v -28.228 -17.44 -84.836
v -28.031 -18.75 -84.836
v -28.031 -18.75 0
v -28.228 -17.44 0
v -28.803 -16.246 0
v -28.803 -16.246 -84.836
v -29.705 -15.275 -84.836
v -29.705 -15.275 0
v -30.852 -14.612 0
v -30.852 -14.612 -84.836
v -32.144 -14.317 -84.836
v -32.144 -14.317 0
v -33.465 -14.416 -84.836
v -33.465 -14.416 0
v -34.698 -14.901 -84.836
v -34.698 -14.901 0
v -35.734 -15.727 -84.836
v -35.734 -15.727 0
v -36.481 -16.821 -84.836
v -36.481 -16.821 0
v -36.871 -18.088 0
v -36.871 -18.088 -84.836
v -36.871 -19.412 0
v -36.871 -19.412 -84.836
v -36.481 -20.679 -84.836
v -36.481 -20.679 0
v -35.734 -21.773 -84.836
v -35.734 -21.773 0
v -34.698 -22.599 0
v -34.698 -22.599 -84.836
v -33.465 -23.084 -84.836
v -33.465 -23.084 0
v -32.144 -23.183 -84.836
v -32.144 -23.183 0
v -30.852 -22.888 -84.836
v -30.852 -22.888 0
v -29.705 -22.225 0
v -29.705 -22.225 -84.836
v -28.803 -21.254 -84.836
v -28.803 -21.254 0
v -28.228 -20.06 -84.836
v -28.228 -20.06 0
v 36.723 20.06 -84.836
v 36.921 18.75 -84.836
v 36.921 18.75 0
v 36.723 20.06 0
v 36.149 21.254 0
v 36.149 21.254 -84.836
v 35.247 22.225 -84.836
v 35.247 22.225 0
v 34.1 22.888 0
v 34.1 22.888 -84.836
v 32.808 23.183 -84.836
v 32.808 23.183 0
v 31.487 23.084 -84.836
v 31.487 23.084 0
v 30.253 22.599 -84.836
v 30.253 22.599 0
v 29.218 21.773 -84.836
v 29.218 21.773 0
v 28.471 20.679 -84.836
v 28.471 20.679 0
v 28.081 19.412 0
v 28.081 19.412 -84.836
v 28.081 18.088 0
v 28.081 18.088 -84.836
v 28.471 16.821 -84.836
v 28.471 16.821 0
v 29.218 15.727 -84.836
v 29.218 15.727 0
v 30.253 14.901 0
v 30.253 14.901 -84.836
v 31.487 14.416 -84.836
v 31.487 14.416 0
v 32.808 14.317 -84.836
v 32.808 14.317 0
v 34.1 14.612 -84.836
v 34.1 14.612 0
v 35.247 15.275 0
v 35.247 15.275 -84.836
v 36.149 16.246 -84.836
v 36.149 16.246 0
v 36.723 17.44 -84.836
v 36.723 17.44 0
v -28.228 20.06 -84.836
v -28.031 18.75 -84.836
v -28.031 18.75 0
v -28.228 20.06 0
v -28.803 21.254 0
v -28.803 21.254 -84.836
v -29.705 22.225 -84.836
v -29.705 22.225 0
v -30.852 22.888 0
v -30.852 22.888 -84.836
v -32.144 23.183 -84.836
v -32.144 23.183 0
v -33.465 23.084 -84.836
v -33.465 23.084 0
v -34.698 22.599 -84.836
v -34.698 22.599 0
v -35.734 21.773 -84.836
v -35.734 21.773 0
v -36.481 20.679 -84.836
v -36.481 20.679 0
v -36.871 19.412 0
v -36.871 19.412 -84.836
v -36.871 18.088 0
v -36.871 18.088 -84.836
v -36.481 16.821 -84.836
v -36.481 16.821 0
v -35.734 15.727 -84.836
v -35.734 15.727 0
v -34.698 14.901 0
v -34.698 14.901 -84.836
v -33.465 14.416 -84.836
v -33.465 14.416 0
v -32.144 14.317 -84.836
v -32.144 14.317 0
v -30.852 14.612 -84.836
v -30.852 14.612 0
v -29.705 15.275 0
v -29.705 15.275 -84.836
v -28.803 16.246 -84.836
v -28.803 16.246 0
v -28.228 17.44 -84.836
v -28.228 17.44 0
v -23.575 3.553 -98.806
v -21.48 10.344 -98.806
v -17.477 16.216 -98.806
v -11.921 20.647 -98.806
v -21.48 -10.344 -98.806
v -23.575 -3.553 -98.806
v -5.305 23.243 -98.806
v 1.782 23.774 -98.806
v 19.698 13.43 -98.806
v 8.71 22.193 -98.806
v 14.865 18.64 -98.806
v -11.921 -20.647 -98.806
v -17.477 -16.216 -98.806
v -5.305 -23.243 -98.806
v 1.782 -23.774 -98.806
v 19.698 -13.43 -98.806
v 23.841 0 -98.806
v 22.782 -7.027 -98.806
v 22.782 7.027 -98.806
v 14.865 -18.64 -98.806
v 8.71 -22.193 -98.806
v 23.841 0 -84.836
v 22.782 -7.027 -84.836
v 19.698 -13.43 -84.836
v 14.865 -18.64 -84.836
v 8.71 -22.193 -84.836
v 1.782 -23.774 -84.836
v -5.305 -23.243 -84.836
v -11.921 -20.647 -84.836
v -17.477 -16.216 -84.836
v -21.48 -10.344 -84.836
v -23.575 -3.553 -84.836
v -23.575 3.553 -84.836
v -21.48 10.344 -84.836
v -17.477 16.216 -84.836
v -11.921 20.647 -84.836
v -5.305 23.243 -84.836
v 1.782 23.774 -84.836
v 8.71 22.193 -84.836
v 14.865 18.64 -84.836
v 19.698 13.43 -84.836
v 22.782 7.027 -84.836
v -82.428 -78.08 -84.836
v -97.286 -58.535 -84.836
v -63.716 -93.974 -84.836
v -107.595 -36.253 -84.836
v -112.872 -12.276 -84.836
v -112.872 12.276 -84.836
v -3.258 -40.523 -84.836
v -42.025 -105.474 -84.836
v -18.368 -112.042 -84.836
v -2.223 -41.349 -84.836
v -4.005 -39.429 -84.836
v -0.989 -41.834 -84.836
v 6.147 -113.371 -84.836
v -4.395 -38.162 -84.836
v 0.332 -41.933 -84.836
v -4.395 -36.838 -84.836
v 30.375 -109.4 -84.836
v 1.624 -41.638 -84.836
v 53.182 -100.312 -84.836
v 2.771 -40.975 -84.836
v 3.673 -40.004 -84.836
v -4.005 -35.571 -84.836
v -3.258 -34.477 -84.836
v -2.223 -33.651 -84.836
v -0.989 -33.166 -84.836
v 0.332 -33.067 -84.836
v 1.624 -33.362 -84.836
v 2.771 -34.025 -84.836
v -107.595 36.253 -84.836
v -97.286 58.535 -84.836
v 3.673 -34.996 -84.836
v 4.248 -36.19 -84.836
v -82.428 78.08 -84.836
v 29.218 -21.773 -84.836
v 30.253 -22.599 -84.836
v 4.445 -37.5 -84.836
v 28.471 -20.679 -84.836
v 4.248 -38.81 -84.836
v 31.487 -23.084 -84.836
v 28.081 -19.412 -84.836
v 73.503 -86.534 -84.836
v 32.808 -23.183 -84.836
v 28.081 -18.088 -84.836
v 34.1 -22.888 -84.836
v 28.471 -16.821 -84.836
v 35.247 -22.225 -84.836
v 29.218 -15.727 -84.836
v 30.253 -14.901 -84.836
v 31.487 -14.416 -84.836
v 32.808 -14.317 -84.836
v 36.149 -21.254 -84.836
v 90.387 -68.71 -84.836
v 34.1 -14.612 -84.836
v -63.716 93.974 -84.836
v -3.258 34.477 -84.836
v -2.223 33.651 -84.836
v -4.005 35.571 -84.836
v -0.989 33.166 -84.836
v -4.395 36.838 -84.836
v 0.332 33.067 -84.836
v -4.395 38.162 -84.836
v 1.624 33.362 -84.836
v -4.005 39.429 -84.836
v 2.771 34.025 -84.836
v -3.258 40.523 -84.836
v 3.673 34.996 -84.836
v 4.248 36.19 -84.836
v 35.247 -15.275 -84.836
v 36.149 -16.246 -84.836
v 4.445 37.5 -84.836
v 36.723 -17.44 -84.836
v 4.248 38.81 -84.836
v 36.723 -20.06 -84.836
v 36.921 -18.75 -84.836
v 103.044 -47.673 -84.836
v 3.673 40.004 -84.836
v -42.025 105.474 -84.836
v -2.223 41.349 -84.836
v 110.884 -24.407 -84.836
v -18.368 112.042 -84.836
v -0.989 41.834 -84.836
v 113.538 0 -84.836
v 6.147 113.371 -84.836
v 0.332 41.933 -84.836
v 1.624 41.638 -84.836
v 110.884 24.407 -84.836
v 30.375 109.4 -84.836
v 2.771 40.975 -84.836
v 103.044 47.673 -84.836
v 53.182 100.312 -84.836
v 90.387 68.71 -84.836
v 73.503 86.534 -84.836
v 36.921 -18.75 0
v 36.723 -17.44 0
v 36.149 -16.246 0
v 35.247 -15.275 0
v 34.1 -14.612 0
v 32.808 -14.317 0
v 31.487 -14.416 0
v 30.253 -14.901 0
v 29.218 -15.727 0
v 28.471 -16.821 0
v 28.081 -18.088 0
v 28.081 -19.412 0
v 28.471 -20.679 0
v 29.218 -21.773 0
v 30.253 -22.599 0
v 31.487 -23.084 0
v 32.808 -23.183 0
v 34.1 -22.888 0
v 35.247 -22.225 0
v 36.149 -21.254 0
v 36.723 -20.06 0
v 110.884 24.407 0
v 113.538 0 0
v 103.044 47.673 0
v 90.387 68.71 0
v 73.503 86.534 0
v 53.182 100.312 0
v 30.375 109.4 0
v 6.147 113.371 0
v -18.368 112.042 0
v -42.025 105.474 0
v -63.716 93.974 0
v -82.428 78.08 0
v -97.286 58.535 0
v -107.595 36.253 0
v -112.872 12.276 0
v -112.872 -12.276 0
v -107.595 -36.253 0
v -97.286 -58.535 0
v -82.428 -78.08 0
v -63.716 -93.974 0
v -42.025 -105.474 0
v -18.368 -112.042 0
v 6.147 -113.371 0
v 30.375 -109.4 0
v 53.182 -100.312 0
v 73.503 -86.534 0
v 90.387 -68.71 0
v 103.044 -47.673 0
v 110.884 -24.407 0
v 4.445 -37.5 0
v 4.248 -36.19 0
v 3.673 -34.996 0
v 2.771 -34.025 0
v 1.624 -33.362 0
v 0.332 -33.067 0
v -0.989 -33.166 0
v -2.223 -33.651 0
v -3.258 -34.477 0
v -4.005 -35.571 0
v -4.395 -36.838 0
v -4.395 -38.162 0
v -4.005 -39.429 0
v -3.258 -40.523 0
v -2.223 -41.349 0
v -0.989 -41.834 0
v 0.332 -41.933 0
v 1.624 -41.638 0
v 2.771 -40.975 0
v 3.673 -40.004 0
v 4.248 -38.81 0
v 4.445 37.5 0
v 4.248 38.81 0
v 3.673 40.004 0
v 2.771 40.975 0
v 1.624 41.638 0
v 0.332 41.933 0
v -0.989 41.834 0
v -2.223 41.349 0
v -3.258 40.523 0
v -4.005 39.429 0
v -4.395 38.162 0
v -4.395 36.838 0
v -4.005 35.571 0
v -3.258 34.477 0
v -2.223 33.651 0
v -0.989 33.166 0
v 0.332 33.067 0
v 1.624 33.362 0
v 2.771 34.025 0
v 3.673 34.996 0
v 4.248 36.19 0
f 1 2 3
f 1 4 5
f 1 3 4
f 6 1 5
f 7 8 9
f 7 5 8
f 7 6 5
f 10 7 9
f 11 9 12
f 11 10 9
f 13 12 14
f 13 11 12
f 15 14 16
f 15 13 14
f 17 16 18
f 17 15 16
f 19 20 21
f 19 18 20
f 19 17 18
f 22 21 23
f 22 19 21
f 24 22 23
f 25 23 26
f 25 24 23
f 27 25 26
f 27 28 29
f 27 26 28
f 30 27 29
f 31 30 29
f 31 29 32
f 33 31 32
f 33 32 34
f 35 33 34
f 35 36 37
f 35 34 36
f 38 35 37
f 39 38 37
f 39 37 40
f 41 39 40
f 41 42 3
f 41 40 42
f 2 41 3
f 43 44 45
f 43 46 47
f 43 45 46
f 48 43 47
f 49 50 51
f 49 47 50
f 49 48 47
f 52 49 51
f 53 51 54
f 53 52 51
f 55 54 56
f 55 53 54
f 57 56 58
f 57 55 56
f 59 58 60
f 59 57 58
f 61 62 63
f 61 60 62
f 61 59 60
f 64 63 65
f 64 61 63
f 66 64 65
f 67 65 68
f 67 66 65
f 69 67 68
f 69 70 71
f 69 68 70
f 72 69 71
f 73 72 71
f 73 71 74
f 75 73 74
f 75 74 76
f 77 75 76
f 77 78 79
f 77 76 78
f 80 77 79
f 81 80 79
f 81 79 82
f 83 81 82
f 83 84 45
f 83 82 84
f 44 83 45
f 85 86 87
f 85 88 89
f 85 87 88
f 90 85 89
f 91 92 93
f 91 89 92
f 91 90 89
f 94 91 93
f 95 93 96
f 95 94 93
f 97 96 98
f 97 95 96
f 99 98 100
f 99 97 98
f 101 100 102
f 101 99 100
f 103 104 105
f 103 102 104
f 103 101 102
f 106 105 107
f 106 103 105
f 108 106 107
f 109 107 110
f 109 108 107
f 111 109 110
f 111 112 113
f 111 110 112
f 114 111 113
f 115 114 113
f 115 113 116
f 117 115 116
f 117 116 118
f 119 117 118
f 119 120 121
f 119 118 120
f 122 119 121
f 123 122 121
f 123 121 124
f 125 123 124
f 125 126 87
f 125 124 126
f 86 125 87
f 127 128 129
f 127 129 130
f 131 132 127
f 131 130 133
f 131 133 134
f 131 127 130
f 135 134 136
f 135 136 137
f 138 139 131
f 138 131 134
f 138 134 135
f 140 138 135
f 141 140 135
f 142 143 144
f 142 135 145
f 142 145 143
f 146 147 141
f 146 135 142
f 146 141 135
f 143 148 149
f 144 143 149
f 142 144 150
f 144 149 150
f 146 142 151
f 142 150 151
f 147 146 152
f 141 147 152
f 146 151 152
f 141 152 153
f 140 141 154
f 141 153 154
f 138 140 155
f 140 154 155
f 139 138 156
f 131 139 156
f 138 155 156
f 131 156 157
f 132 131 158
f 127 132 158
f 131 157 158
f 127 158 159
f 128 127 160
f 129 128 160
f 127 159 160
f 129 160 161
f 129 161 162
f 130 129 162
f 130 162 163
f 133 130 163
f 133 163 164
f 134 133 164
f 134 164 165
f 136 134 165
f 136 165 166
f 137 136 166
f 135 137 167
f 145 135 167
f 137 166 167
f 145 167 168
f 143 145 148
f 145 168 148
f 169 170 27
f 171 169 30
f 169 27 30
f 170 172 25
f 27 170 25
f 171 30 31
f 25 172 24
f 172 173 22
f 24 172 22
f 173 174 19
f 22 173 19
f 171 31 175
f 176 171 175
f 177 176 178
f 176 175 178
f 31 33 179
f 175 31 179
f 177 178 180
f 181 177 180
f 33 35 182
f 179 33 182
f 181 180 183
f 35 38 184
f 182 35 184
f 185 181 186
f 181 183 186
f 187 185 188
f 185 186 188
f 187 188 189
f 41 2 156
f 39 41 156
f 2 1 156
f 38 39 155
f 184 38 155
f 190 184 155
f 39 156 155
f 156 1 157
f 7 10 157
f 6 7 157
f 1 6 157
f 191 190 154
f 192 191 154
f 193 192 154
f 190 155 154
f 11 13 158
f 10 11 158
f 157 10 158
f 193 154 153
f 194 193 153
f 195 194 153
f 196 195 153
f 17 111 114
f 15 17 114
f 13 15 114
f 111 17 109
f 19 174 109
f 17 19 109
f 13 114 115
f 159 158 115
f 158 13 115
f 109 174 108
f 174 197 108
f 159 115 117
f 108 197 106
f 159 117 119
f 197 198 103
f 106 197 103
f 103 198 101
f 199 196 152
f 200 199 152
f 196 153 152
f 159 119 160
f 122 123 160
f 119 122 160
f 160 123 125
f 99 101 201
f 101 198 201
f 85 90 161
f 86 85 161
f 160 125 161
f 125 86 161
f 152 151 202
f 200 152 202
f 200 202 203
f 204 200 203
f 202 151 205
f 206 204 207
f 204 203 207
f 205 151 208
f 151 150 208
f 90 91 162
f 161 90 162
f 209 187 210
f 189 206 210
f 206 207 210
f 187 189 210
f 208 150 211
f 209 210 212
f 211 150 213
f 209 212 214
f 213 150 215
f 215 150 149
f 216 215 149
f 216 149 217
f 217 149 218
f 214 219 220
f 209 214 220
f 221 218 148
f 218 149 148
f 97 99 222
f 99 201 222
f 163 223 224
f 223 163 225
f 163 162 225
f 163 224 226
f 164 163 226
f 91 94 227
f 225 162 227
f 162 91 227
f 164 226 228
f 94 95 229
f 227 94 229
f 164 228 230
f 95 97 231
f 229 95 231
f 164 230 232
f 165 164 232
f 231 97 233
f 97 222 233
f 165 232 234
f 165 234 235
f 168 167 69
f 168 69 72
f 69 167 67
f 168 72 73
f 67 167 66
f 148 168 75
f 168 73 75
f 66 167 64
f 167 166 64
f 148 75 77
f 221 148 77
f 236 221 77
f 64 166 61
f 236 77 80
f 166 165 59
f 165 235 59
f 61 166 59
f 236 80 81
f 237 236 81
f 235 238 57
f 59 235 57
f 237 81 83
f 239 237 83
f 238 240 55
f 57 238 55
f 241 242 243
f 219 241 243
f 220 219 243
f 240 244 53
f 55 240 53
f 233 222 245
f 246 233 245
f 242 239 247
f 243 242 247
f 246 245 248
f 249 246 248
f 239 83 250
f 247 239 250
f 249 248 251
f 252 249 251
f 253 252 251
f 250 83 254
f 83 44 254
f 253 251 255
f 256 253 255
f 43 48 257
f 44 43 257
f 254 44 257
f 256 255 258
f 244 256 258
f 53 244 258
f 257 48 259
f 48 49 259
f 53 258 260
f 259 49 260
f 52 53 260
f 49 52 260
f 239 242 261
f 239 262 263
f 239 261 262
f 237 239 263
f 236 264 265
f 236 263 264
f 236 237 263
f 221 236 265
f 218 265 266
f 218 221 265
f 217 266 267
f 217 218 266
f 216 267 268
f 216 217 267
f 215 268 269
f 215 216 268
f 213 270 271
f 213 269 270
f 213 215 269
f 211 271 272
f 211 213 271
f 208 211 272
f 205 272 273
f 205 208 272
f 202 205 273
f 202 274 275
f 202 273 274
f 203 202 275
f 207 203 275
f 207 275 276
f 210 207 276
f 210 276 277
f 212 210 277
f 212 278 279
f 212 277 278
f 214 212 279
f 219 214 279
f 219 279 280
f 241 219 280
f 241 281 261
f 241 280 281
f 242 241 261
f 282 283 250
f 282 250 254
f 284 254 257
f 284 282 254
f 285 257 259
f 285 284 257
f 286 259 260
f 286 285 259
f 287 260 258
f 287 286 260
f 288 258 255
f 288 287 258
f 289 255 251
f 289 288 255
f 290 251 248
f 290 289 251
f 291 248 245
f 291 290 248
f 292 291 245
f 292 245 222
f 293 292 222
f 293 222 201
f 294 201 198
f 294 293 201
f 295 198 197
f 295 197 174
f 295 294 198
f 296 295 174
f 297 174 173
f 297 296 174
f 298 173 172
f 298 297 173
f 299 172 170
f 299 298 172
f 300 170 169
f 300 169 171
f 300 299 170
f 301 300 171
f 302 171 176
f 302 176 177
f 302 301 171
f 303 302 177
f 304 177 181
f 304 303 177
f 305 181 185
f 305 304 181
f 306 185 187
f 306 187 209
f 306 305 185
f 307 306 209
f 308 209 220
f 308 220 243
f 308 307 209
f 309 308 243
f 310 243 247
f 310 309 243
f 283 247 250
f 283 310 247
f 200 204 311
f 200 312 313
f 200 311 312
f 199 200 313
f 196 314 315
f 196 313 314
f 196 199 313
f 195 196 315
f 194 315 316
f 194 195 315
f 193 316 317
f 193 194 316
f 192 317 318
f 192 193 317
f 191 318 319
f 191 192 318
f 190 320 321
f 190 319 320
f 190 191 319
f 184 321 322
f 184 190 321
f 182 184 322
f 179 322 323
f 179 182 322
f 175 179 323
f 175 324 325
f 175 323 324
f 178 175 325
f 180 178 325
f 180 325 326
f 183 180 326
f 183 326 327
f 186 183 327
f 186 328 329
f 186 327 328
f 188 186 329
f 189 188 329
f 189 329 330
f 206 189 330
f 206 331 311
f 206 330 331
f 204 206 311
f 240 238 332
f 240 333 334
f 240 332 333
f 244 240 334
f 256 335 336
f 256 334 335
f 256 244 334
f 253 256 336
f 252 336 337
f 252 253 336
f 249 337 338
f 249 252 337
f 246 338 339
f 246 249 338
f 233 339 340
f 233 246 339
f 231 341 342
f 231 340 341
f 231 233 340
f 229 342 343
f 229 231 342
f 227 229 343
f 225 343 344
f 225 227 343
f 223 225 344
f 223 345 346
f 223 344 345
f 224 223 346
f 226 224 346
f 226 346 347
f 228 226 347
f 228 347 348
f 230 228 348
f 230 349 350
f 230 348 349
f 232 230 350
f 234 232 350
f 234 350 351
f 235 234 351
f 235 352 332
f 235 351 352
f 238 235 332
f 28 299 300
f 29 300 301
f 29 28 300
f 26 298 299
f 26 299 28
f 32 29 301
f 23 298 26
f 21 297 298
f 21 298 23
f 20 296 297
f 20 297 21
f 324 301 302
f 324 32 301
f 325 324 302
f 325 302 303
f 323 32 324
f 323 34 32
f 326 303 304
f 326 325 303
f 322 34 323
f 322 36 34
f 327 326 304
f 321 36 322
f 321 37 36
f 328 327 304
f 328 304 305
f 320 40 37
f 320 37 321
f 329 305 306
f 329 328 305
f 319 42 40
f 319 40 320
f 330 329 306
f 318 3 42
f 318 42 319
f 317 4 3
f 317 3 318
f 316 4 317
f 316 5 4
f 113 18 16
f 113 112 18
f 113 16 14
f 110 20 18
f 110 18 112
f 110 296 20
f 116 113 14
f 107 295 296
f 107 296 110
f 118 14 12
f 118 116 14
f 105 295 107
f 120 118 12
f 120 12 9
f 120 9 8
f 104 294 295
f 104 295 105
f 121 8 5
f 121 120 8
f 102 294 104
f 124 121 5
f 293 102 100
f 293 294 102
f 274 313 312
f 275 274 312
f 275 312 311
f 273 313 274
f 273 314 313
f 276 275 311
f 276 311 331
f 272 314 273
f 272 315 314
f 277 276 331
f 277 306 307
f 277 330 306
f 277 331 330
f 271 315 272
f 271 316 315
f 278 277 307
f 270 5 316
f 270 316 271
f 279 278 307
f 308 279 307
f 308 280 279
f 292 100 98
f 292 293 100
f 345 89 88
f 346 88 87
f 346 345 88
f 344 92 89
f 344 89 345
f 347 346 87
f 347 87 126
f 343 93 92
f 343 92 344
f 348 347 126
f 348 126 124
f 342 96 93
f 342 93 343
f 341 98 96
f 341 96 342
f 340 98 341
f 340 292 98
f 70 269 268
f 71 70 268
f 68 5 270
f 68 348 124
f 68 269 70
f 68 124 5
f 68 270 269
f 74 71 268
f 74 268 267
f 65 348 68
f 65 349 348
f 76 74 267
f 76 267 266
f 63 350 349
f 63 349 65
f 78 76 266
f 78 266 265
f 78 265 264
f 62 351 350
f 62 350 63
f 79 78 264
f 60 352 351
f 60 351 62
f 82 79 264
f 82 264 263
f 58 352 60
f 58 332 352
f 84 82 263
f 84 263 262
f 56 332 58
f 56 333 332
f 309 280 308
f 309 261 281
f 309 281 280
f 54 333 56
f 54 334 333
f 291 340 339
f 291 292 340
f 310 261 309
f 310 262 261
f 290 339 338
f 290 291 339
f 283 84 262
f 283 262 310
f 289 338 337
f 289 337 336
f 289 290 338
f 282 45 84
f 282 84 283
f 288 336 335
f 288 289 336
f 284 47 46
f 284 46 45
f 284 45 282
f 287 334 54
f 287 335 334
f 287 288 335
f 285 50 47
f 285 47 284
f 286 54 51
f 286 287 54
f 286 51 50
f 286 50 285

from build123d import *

# Parameters (mm, degrees)
SKETCH1_R               = 113.538
BOSS_EXTRUDE1_DEPTH     = 84.836
CUT_EXTRUDE1_DEPTH      = 182.600941033
CUT_EXTRUDE1_DEPTH_BACK = 182.600941033
SKETCH2_R               = 4.445
SKETCH4_R               = 23.841151021
BOSS_EXTRUDE2_DEPTH     = 13.97


with BuildPart() as part:
    # Sketch1 → Boss-Extrude1 (new body)
    with BuildSketch(Plane.XY):
        Circle(SKETCH1_R)
    extrude(amount=-BOSS_EXTRUDE1_DEPTH)

    # Sketch2 → Cut-Extrude1 (cut, two sides: drawn at the far end of the back side and taken through both)
    with BuildSketch(Plane.XY.offset(-CUT_EXTRUDE1_DEPTH_BACK)):
        with Locations((0, 37.49999993)):
            Circle(SKETCH2_R)
        with Locations((32.475952581, 18.749999965)):
            Circle(SKETCH2_R)
        with Locations((32.475952581, -18.749999965)):
            Circle(SKETCH2_R)
        with Locations((0, -37.49999993)):
            Circle(SKETCH2_R)
        with Locations((-32.475952581, -18.749999965)):
            Circle(SKETCH2_R)
        with Locations((-32.475952581, 18.749999965)):
            Circle(SKETCH2_R)
    extrude(amount=CUT_EXTRUDE1_DEPTH + CUT_EXTRUDE1_DEPTH_BACK, mode=Mode.SUBTRACT)

    # Sketch4 → Boss-Extrude2 (add)
    with BuildSketch(Plane(origin=(0, 0, -84.836), x_dir=(-1, 0, 0), z_dir=(0, 0, -1))):
        with Locations(Location((0, 0, 0), (0, 0, 180))):
            Circle(SKETCH4_R)
    extrude(amount=BOSS_EXTRUDE2_DEPTH)


solid = part.part
